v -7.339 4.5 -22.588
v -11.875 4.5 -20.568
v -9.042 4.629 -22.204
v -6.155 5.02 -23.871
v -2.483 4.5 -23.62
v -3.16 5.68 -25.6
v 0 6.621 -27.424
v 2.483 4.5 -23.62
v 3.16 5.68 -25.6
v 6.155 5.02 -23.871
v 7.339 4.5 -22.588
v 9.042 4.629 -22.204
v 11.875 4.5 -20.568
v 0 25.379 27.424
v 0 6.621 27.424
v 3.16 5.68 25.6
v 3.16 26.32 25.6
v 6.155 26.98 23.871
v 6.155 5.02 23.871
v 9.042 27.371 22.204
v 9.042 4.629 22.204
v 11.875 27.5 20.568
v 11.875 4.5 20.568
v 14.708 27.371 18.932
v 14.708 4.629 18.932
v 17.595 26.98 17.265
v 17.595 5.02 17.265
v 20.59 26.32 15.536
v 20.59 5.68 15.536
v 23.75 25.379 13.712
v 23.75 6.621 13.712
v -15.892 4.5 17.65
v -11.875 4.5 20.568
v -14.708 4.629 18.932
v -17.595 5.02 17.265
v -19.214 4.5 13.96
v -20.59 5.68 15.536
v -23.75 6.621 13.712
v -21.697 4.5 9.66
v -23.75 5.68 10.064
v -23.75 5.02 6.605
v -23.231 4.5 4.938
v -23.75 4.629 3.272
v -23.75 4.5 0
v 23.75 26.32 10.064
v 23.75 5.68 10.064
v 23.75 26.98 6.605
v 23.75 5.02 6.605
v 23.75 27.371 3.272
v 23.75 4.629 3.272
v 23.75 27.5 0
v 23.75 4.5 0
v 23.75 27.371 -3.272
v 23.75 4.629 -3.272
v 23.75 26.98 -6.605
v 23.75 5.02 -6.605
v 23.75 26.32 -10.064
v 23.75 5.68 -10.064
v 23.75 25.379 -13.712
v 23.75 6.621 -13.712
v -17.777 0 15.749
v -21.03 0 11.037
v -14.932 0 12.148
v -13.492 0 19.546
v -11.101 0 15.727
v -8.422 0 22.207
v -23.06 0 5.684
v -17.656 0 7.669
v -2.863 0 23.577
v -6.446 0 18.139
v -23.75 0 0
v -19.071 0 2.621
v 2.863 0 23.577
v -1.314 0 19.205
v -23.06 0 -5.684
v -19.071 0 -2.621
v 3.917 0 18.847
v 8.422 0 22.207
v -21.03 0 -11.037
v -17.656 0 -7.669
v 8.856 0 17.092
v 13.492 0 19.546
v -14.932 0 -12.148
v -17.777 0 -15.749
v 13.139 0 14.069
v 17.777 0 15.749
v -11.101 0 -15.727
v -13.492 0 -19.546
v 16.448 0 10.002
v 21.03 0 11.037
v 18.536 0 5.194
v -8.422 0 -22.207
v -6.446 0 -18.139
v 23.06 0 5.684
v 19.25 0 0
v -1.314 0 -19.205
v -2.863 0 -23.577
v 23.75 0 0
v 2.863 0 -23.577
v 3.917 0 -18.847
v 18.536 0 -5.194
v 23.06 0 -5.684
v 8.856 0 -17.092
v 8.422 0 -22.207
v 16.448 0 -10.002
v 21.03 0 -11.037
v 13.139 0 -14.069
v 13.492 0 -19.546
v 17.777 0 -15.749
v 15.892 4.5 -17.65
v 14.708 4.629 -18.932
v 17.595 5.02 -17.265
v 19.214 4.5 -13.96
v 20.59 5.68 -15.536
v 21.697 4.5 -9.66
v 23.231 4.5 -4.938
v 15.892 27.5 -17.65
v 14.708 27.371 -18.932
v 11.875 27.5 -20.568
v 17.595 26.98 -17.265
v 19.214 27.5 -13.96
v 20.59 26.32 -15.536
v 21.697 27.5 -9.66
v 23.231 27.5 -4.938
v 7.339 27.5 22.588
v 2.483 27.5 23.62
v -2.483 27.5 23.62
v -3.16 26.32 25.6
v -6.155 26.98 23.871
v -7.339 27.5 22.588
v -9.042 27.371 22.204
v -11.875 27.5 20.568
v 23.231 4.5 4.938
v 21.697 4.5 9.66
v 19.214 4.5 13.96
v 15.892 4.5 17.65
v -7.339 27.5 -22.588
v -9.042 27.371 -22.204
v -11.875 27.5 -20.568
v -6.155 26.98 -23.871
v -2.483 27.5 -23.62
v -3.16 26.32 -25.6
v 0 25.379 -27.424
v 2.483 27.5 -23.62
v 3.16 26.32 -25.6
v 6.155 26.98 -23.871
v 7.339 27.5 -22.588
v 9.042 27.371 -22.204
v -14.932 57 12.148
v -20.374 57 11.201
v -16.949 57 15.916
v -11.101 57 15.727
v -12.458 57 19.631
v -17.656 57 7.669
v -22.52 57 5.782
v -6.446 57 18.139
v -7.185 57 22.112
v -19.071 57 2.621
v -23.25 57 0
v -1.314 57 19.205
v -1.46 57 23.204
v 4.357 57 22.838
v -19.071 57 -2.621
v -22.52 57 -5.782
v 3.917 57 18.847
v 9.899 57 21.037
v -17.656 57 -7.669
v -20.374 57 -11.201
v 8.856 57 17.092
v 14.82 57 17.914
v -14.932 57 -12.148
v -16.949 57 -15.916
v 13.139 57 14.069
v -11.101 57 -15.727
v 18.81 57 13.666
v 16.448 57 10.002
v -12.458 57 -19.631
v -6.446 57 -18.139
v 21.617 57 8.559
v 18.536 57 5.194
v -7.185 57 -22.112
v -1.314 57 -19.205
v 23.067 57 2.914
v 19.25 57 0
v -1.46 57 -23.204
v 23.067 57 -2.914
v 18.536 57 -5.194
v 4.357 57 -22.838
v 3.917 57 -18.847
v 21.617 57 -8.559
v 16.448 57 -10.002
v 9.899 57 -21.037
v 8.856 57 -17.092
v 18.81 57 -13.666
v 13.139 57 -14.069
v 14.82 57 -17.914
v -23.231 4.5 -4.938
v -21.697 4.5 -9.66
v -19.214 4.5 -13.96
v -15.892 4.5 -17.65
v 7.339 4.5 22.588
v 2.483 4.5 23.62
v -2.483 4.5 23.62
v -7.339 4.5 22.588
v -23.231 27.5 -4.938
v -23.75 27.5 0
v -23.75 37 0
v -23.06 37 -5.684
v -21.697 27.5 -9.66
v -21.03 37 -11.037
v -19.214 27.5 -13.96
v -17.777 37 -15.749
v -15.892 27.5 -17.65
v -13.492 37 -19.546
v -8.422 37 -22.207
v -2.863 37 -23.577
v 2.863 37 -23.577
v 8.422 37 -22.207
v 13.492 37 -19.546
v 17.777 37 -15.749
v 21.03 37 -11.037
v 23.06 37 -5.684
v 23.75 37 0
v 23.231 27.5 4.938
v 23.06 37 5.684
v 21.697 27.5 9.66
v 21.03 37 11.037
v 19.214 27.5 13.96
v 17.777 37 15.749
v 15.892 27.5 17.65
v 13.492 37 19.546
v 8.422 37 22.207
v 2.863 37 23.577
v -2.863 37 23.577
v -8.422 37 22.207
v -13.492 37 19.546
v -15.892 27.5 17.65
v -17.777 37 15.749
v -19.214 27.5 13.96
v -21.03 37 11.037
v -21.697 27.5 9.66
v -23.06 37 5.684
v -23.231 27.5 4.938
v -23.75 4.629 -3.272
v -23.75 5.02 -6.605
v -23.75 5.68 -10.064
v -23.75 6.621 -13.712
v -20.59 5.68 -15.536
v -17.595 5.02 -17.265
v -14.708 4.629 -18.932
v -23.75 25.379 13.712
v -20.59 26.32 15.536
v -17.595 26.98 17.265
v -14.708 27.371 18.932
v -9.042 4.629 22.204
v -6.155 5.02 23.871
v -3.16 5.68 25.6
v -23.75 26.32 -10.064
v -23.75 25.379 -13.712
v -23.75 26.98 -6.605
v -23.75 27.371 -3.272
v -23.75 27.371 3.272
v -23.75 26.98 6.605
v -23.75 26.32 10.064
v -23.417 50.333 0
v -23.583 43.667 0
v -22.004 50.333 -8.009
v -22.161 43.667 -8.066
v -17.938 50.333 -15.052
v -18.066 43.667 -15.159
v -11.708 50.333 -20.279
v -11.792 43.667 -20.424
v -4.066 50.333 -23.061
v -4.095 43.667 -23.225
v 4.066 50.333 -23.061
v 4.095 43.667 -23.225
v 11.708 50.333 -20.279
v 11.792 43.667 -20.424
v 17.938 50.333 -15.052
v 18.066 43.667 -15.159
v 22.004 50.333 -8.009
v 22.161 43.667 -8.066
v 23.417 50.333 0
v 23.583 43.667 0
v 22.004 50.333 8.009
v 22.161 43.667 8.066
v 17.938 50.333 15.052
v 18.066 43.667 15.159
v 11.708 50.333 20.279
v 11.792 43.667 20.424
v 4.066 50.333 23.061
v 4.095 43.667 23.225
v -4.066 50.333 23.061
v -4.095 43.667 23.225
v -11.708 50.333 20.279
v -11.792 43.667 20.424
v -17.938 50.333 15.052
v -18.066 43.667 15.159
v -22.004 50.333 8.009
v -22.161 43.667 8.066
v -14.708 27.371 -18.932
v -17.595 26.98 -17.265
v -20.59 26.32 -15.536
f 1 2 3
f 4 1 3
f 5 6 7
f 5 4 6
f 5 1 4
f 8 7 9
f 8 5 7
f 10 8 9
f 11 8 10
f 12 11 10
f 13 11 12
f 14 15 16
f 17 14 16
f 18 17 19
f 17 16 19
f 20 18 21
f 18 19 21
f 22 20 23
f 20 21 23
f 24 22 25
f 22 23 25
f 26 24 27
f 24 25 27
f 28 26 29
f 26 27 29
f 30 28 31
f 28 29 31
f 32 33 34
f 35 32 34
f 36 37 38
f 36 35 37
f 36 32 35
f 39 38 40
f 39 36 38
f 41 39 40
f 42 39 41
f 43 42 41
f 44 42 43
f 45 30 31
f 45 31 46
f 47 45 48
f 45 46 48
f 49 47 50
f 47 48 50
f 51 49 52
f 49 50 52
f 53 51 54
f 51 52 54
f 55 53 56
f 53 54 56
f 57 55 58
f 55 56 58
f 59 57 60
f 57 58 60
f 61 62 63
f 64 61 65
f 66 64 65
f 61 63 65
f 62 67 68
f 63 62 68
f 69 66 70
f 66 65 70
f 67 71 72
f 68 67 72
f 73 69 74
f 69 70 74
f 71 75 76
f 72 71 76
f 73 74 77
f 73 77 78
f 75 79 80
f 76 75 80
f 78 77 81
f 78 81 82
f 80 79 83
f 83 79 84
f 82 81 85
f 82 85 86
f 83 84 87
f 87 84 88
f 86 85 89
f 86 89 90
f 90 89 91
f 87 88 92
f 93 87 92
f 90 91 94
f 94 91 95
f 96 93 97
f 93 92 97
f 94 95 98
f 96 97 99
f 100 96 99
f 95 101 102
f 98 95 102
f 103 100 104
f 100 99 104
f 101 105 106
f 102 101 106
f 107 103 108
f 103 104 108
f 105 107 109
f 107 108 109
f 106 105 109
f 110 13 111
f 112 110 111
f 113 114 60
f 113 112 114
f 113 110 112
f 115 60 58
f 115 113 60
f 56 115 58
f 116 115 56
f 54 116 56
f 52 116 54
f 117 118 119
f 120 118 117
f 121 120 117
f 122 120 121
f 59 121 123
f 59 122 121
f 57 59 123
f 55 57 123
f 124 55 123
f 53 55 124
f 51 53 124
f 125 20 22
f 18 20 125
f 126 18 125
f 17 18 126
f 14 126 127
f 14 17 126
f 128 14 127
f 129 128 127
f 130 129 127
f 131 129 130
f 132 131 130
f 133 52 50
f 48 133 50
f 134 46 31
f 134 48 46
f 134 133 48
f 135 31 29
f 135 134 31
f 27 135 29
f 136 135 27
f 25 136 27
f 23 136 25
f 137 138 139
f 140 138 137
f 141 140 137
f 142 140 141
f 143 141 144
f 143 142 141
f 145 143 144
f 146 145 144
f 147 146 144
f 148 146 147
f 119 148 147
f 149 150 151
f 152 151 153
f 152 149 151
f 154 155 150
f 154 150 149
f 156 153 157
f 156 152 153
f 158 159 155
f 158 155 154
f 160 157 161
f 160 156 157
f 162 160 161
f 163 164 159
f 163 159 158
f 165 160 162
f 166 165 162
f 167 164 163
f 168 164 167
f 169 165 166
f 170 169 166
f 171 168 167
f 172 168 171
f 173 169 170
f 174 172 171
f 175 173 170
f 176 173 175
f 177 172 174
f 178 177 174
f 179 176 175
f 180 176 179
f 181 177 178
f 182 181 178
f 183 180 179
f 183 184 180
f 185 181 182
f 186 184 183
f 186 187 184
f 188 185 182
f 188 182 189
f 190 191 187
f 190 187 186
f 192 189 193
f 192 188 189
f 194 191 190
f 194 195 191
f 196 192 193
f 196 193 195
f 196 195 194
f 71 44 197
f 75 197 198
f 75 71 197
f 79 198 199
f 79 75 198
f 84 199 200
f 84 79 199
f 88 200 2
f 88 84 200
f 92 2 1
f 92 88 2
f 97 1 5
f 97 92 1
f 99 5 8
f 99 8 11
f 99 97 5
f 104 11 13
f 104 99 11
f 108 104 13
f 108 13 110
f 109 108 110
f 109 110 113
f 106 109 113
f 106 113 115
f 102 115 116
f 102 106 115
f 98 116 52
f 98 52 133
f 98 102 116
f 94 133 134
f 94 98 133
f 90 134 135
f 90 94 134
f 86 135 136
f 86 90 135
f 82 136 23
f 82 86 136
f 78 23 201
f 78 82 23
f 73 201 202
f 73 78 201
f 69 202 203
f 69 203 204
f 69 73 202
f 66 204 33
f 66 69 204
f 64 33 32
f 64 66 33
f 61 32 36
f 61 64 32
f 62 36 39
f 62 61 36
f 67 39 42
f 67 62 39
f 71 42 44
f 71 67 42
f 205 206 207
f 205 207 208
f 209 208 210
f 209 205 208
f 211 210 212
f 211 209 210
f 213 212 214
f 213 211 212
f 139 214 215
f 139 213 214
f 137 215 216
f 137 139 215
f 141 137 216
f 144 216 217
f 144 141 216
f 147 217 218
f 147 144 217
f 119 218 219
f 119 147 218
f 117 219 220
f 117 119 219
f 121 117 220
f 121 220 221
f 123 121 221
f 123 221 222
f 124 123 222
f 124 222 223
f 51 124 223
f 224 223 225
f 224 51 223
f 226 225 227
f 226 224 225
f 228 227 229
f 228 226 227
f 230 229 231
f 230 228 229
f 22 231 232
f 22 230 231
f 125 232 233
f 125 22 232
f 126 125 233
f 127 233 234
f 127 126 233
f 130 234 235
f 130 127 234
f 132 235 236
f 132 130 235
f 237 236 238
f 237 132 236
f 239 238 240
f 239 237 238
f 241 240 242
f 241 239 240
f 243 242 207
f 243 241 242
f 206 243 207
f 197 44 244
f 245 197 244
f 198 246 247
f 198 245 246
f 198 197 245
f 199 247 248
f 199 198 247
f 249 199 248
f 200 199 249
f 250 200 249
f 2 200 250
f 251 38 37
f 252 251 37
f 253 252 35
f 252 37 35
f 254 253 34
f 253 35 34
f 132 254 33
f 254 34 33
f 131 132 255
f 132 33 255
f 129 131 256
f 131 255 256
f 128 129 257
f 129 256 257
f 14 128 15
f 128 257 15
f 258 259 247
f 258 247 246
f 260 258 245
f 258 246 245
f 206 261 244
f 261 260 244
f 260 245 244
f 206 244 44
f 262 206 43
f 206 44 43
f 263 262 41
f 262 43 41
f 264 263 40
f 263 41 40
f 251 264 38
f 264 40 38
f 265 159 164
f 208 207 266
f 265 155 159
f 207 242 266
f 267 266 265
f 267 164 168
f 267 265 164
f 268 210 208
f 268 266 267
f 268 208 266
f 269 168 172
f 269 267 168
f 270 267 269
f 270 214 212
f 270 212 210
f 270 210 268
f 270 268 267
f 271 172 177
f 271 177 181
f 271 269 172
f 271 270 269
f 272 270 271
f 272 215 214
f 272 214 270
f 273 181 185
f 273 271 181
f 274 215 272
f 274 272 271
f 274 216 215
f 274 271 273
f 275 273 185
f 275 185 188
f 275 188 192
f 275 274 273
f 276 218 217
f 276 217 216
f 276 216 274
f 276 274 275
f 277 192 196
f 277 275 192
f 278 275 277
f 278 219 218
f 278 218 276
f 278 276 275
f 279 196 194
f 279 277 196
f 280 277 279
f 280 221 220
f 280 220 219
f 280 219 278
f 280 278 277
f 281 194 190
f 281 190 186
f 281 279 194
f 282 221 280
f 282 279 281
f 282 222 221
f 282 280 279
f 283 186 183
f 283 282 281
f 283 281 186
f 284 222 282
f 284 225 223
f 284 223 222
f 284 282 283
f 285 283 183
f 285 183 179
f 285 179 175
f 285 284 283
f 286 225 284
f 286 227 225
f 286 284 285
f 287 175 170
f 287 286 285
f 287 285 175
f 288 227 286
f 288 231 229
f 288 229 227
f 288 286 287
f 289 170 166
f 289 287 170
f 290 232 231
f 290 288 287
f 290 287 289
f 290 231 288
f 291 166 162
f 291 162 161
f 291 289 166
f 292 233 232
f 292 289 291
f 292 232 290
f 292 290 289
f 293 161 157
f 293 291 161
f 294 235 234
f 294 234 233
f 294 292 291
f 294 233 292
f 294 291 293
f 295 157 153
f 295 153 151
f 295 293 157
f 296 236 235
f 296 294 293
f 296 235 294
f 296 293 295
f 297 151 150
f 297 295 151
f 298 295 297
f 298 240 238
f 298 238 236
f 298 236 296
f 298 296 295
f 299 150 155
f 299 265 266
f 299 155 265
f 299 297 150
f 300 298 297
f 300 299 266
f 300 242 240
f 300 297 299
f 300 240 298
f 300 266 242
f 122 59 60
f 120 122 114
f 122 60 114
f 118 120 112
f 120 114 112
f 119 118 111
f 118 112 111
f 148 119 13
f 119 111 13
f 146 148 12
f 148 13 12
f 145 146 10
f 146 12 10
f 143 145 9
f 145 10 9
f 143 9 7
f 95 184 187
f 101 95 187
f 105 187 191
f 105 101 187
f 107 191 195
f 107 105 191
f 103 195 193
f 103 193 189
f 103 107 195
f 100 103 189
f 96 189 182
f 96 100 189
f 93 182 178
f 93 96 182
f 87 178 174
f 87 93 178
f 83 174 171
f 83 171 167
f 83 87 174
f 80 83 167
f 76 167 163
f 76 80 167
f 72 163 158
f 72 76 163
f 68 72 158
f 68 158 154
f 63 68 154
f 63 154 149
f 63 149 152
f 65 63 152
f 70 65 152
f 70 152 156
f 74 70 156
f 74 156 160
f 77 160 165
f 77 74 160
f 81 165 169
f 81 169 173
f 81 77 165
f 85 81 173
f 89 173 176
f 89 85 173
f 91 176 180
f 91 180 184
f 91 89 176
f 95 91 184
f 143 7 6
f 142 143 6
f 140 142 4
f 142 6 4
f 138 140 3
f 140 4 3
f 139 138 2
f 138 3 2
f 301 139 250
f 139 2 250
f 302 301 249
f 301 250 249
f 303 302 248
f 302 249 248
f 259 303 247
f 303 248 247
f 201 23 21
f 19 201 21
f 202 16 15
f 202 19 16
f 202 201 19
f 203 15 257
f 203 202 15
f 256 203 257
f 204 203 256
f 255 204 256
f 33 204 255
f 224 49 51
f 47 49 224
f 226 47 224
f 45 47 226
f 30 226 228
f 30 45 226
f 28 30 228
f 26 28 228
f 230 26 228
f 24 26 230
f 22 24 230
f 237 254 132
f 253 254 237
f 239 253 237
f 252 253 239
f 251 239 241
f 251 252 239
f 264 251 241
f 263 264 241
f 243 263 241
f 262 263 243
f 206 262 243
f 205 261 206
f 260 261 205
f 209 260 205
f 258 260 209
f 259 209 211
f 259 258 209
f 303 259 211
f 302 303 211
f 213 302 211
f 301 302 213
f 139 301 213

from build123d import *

# Parameters (mm, degrees)
SKETCH2_R           = 19.25
BOSS_EXTRUDE1_DEPTH = 57


with BuildPart() as part:
    # Sketch2 → Boss-Extrude1 (new body)
    with BuildSketch(Plane(origin=(0, 0, 0), x_dir=(1, 0, 0), z_dir=(0, 1, 0))):
        Polygon((0, 27.424137787), (-23.75, 13.712068893), (-23.75, -13.712068893), (0, -27.424137787), (23.75, -13.712068893), (23.75, 13.712068893), align=None)
        Circle(SKETCH2_R, mode=Mode.SUBTRACT)
    extrude(amount=BOSS_EXTRUDE1_DEPTH)

    # Sketch3 → Cut-Revolve2 (revolve, cut)
    with BuildSketch(Plane.XY):
        Polygon((0, 57), (-23.25, 57), (-23.75, 37), (-23.75, 27.5), (-33.75, 21.726497308), (-33.75, 10.273502692), (-23.75, 4.5), (-23.75, 0), (-45.690595107, 0), (-45.690595107, 61.224990586), (0, 61.224990586), align=None)
    revolve(axis=Axis((0, 64.286240116, 0), (0, -1, 0)), mode=Mode.SUBTRACT)


solid = part.part
